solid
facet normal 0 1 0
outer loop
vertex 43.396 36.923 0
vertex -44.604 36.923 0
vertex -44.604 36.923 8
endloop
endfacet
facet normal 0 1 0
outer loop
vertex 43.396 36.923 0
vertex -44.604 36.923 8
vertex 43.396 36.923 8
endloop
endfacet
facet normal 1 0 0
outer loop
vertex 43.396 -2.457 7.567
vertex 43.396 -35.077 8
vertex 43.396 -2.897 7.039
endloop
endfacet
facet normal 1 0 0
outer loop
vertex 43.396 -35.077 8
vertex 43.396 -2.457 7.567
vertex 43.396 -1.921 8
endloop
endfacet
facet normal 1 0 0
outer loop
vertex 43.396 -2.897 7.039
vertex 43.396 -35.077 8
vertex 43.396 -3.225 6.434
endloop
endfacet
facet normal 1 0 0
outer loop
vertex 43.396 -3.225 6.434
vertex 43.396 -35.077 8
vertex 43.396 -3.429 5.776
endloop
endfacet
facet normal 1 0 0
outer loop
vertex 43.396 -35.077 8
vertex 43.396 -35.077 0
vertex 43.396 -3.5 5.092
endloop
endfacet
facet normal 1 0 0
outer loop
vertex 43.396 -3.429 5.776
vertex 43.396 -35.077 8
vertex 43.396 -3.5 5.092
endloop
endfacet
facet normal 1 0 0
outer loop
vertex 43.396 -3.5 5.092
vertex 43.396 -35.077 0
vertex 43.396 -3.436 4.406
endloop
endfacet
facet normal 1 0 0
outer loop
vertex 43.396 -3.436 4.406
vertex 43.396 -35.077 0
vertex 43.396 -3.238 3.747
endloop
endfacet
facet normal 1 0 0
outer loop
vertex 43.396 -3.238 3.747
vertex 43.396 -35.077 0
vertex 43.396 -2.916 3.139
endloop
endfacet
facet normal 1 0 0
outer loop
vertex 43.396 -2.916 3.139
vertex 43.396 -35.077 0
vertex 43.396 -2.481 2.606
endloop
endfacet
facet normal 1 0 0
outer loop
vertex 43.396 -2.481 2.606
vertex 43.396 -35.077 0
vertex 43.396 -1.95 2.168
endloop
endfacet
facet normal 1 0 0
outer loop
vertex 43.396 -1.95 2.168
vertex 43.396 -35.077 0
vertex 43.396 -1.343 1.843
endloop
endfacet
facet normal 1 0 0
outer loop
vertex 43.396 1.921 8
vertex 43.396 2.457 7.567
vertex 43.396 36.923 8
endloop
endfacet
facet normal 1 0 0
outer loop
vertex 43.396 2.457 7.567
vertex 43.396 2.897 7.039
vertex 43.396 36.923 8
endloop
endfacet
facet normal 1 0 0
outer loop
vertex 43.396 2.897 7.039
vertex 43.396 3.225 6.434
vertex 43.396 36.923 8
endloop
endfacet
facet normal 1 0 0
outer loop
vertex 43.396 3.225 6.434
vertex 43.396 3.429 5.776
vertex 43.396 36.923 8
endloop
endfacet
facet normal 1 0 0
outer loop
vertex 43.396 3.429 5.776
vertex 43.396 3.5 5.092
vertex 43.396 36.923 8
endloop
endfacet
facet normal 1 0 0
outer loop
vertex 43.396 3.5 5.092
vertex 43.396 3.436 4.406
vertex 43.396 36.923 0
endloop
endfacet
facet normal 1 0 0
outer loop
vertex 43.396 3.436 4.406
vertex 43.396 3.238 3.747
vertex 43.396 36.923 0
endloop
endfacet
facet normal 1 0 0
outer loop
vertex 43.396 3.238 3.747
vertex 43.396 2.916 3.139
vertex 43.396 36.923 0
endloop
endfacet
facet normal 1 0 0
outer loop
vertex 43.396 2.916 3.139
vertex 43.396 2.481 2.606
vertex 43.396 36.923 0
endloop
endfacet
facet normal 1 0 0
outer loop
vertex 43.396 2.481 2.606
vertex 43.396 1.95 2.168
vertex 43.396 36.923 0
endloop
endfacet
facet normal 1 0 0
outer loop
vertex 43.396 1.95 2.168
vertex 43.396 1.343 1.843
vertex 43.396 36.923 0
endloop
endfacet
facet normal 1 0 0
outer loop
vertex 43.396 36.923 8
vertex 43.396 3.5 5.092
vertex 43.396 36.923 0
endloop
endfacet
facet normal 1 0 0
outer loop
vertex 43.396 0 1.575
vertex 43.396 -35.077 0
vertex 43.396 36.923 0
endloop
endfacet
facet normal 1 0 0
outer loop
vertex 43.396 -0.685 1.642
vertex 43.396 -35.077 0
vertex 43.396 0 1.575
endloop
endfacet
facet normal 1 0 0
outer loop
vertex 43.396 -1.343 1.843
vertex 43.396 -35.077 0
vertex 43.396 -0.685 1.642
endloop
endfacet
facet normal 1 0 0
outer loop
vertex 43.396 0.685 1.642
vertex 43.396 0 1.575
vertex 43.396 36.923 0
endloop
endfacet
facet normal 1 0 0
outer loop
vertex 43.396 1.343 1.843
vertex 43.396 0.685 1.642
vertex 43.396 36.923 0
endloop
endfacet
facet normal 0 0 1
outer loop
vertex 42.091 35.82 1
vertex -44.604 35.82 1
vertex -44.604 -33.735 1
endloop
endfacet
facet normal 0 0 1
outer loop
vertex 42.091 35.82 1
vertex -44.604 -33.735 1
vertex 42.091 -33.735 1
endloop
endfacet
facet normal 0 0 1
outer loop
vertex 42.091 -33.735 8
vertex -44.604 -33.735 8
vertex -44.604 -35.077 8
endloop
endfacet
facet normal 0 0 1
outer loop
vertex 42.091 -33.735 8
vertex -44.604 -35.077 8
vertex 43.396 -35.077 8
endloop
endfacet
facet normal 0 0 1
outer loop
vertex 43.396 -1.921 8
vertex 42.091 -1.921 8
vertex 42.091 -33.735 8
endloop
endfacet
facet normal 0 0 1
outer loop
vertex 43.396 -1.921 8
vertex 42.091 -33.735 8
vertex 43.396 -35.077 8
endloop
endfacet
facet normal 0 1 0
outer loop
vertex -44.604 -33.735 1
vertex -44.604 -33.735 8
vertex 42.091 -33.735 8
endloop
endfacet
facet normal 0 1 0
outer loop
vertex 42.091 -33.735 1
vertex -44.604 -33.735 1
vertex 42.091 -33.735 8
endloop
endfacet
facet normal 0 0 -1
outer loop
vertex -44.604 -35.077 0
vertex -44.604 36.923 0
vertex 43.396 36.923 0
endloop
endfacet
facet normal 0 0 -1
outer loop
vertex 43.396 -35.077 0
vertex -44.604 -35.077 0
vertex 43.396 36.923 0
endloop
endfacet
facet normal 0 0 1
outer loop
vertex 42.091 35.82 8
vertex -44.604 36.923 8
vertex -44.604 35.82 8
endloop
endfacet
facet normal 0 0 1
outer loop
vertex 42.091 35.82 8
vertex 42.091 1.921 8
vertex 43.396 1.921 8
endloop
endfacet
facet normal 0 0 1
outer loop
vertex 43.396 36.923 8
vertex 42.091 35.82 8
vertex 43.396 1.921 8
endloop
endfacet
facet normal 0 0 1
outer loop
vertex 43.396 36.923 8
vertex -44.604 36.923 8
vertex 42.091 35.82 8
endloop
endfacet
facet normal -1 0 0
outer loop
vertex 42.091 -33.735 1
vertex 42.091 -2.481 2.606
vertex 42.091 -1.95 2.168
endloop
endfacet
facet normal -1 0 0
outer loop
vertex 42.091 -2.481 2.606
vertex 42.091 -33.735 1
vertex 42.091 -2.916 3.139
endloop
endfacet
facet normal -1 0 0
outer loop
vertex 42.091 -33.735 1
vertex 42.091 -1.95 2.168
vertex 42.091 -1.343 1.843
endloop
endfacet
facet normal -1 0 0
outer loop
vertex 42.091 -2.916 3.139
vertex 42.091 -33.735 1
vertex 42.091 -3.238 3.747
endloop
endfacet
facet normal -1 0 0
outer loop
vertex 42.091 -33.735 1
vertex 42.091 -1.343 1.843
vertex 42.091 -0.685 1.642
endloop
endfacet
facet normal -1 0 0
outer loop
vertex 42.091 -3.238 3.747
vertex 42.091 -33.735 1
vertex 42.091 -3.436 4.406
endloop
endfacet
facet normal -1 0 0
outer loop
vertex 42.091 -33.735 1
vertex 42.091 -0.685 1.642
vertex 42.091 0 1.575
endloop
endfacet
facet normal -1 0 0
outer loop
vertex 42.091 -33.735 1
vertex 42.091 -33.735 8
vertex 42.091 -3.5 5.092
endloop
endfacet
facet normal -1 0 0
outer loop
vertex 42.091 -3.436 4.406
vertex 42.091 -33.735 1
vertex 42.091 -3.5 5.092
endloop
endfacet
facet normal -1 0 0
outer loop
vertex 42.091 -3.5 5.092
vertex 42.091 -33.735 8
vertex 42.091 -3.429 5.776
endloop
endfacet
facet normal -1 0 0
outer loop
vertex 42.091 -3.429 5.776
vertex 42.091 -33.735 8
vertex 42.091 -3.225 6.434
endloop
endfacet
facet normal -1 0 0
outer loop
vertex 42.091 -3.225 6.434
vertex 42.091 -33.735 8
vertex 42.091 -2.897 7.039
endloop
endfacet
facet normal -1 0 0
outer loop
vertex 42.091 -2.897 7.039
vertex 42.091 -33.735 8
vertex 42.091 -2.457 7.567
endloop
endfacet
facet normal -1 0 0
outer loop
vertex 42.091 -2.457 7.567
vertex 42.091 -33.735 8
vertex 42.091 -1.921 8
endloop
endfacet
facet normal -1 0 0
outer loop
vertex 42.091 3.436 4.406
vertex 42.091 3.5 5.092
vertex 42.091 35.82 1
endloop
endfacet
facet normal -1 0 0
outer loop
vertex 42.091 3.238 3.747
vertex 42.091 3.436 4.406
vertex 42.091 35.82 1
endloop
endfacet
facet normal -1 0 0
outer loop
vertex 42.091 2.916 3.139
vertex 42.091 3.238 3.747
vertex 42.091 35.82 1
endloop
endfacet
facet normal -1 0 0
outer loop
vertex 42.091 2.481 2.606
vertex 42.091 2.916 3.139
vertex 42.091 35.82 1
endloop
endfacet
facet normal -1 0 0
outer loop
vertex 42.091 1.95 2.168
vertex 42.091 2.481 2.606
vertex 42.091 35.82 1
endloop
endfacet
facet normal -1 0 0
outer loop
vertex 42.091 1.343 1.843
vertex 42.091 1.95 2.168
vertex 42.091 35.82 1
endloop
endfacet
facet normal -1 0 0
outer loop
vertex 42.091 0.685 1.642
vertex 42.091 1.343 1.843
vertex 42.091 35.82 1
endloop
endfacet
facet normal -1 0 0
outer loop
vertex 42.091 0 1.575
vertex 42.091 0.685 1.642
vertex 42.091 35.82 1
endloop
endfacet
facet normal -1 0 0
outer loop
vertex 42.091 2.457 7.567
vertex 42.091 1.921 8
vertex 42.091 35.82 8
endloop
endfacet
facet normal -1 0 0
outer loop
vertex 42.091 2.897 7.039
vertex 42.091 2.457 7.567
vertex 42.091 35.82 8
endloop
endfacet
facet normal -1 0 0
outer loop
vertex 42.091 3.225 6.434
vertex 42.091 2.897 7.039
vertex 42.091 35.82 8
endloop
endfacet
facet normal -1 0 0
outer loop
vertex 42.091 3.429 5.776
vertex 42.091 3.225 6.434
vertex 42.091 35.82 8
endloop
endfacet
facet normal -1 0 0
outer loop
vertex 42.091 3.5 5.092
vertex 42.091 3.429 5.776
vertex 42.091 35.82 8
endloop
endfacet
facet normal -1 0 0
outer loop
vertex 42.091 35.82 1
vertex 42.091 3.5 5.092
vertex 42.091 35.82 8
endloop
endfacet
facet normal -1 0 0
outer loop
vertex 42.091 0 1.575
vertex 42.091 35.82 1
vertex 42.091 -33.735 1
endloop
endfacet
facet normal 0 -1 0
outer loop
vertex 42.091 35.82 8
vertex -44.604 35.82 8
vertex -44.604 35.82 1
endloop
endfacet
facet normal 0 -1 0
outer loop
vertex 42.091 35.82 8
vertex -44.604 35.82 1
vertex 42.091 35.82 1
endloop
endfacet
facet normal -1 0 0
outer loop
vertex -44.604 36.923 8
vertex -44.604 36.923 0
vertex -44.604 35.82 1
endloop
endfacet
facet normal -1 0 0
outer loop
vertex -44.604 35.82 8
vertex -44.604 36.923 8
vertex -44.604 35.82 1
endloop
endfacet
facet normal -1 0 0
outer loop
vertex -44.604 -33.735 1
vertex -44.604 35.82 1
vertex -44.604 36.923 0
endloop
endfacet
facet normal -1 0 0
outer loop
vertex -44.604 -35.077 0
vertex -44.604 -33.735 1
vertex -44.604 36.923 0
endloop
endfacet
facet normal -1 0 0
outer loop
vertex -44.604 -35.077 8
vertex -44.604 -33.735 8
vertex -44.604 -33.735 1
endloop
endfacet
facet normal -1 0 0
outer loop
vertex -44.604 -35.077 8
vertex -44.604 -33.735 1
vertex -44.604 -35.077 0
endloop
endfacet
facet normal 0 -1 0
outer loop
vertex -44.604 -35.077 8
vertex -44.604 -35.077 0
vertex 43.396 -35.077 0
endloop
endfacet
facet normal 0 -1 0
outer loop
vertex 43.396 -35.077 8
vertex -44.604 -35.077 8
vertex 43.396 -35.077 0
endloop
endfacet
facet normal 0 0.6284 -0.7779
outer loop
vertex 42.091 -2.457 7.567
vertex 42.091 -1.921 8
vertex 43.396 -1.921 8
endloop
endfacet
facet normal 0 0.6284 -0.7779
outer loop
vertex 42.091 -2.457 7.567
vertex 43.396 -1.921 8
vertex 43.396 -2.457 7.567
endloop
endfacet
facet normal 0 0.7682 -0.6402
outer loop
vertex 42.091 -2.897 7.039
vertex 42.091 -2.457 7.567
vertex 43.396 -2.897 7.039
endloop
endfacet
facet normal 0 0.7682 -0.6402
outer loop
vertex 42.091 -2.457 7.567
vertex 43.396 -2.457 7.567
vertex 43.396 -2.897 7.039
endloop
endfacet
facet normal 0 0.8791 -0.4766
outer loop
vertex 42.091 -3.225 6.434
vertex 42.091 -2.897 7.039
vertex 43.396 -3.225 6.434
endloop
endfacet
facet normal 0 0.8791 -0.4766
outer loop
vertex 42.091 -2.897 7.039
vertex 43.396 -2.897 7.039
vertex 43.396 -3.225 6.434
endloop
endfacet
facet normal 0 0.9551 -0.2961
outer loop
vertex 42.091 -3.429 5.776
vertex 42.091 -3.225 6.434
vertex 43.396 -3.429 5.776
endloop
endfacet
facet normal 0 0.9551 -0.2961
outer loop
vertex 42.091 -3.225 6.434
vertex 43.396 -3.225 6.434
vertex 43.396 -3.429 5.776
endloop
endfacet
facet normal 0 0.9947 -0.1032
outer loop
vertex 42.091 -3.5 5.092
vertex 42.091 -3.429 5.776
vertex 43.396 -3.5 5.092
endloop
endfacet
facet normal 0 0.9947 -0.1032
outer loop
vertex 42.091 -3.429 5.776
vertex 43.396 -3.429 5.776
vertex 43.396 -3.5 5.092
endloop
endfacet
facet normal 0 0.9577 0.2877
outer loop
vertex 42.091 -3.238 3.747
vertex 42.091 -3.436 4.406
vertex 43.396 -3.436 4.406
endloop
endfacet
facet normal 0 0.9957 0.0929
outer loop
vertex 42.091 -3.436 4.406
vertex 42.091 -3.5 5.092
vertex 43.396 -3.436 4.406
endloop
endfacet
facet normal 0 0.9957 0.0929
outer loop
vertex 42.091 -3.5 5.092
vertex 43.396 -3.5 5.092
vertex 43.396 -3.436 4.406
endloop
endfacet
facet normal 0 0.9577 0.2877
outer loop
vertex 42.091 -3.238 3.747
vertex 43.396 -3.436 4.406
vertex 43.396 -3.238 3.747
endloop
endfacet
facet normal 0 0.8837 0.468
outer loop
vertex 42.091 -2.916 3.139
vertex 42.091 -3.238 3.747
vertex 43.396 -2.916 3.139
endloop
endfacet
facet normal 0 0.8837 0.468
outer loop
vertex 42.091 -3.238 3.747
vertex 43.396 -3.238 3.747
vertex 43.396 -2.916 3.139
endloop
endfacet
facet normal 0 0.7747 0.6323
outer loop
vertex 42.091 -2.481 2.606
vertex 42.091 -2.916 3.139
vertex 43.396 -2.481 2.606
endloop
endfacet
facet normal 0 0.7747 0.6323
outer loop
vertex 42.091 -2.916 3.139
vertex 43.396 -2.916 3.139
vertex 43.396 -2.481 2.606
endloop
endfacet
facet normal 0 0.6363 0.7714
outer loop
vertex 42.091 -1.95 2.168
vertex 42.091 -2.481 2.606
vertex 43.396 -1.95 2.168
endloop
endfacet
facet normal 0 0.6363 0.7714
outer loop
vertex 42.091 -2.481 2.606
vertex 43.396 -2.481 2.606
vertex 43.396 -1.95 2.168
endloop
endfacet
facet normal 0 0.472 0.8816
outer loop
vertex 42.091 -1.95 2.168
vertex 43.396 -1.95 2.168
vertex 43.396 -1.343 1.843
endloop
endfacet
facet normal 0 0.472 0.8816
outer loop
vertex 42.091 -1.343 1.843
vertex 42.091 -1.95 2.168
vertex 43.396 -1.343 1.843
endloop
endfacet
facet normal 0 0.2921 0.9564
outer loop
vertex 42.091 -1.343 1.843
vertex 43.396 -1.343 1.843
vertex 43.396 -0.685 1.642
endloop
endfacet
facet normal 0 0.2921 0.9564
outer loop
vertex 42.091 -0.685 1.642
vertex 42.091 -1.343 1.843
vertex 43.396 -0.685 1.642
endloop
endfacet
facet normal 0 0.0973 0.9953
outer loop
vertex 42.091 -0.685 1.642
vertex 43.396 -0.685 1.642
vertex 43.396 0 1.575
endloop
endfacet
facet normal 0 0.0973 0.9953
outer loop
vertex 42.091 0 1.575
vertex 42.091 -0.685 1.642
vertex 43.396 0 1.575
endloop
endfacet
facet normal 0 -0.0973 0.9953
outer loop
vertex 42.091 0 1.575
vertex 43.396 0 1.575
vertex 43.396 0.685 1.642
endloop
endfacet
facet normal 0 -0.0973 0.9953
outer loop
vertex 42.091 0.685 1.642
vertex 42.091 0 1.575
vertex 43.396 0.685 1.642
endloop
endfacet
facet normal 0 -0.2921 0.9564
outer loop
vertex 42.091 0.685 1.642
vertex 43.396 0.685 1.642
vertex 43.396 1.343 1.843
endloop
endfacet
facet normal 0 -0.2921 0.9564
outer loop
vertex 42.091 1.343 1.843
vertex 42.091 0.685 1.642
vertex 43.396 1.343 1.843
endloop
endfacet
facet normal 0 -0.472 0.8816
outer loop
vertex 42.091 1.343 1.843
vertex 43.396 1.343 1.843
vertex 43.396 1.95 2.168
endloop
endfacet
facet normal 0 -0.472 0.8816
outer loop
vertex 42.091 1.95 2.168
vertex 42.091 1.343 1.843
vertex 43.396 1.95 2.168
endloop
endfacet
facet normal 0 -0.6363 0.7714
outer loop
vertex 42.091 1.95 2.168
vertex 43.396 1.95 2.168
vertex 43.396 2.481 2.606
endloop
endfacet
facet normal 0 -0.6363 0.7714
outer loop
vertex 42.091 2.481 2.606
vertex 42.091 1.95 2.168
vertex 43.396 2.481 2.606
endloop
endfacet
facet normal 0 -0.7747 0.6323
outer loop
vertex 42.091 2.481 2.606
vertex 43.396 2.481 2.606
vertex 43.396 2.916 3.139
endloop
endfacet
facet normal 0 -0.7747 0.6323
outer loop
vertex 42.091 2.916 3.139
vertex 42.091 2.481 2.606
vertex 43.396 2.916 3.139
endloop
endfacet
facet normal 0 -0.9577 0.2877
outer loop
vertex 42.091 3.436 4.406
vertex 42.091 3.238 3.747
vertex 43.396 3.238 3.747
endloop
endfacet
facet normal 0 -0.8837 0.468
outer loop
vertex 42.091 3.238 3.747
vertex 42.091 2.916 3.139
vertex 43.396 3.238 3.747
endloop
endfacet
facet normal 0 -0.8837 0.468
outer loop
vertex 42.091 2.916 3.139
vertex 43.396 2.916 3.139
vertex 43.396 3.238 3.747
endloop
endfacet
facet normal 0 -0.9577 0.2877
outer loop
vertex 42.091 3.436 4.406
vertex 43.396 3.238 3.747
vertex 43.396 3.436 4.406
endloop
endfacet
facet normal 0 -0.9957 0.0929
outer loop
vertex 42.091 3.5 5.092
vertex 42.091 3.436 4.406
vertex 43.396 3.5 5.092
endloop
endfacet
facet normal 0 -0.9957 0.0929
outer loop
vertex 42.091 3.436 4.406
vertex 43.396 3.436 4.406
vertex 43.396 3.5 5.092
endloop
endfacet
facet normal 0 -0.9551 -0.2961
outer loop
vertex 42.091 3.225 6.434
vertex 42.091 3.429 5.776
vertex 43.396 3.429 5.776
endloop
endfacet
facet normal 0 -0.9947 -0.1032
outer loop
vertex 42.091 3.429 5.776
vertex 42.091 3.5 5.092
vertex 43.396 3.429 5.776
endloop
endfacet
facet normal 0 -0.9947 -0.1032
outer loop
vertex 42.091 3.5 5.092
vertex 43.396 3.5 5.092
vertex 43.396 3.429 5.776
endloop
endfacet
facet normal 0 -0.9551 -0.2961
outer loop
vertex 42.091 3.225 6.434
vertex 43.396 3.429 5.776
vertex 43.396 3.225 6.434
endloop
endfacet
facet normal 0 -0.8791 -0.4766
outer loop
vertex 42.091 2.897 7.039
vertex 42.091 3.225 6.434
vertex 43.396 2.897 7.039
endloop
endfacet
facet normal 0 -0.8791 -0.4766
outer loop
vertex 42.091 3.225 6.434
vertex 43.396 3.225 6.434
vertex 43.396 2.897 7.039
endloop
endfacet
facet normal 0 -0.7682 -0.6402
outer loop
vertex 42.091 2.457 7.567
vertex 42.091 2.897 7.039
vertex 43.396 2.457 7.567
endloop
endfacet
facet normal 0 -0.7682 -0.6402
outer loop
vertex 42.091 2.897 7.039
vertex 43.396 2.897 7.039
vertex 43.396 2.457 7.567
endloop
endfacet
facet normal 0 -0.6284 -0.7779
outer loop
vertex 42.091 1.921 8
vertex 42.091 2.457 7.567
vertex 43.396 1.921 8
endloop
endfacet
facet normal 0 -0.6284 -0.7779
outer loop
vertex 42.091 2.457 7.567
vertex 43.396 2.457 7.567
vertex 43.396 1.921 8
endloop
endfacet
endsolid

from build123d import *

# Parameters (mm, degrees)
F0_W           = 90
F0_H           = 72
F1_DEPTH       = 8
F2_W           = 87.5752791762
F2_H           = 69.5543810725
F3_DEPTH       = 7
F5_D           = 7
F5_CBORE_D     = 7
F5_CBORE_DEPTH = 1
F7_DEPTH       = 2


with BuildPart() as f1:
    # F0 (on Top) → F1 (new body)
    with BuildSketch(Plane.XY):
        with Locations((-1.6035065055, 0.9231414078)):
            Rectangle(F0_W, F0_H)
    extrude(amount=F1_DEPTH)

    # F2 (on face) → F3 (cut)
    with BuildSketch(Plane.XY.offset(8)):
        with Locations((-1.6968734562, 1.0423921049)):
            Rectangle(F2_W, F2_H)
    extrude(amount=-F3_DEPTH, mode=Mode.SUBTRACT)

    # F5 (through all)
    with Locations(Plane(origin=(-46.6035065055, 0, 0), x_dir=(0, -1, 0), z_dir=(-1, 0, 0))):
        with Locations((0, 5.0745382905)):
            CounterBoreHole(F5_D / 2, F5_CBORE_D / 2, F5_CBORE_DEPTH)

    # F6 (on face) → F7 (cut)
    with BuildSketch(Plane(origin=(-46.6035065055, 0, 0), x_dir=(0, -1, 0), z_dir=(-1, 0, 0))):
        with BuildLine():
            Line((-36.9231414078, 8), (-36.9231414078, 0))
            Line((-36.9231414078, 0), (35.0768585922, 0))
            Line((35.0768585922, 0), (35.0768585922, 8))
            Line((35.0768585922, 8), (1.921372891, 8))
            ThreePointArc((1.921372891, 8), (0, 1.5745382905), (-1.921372891, 8))
            Line((-1.921372891, 8), (-36.9231414078, 8))
        make_face()
    extrude(amount=-F7_DEPTH, mode=Mode.SUBTRACT)


solid = f1.part
